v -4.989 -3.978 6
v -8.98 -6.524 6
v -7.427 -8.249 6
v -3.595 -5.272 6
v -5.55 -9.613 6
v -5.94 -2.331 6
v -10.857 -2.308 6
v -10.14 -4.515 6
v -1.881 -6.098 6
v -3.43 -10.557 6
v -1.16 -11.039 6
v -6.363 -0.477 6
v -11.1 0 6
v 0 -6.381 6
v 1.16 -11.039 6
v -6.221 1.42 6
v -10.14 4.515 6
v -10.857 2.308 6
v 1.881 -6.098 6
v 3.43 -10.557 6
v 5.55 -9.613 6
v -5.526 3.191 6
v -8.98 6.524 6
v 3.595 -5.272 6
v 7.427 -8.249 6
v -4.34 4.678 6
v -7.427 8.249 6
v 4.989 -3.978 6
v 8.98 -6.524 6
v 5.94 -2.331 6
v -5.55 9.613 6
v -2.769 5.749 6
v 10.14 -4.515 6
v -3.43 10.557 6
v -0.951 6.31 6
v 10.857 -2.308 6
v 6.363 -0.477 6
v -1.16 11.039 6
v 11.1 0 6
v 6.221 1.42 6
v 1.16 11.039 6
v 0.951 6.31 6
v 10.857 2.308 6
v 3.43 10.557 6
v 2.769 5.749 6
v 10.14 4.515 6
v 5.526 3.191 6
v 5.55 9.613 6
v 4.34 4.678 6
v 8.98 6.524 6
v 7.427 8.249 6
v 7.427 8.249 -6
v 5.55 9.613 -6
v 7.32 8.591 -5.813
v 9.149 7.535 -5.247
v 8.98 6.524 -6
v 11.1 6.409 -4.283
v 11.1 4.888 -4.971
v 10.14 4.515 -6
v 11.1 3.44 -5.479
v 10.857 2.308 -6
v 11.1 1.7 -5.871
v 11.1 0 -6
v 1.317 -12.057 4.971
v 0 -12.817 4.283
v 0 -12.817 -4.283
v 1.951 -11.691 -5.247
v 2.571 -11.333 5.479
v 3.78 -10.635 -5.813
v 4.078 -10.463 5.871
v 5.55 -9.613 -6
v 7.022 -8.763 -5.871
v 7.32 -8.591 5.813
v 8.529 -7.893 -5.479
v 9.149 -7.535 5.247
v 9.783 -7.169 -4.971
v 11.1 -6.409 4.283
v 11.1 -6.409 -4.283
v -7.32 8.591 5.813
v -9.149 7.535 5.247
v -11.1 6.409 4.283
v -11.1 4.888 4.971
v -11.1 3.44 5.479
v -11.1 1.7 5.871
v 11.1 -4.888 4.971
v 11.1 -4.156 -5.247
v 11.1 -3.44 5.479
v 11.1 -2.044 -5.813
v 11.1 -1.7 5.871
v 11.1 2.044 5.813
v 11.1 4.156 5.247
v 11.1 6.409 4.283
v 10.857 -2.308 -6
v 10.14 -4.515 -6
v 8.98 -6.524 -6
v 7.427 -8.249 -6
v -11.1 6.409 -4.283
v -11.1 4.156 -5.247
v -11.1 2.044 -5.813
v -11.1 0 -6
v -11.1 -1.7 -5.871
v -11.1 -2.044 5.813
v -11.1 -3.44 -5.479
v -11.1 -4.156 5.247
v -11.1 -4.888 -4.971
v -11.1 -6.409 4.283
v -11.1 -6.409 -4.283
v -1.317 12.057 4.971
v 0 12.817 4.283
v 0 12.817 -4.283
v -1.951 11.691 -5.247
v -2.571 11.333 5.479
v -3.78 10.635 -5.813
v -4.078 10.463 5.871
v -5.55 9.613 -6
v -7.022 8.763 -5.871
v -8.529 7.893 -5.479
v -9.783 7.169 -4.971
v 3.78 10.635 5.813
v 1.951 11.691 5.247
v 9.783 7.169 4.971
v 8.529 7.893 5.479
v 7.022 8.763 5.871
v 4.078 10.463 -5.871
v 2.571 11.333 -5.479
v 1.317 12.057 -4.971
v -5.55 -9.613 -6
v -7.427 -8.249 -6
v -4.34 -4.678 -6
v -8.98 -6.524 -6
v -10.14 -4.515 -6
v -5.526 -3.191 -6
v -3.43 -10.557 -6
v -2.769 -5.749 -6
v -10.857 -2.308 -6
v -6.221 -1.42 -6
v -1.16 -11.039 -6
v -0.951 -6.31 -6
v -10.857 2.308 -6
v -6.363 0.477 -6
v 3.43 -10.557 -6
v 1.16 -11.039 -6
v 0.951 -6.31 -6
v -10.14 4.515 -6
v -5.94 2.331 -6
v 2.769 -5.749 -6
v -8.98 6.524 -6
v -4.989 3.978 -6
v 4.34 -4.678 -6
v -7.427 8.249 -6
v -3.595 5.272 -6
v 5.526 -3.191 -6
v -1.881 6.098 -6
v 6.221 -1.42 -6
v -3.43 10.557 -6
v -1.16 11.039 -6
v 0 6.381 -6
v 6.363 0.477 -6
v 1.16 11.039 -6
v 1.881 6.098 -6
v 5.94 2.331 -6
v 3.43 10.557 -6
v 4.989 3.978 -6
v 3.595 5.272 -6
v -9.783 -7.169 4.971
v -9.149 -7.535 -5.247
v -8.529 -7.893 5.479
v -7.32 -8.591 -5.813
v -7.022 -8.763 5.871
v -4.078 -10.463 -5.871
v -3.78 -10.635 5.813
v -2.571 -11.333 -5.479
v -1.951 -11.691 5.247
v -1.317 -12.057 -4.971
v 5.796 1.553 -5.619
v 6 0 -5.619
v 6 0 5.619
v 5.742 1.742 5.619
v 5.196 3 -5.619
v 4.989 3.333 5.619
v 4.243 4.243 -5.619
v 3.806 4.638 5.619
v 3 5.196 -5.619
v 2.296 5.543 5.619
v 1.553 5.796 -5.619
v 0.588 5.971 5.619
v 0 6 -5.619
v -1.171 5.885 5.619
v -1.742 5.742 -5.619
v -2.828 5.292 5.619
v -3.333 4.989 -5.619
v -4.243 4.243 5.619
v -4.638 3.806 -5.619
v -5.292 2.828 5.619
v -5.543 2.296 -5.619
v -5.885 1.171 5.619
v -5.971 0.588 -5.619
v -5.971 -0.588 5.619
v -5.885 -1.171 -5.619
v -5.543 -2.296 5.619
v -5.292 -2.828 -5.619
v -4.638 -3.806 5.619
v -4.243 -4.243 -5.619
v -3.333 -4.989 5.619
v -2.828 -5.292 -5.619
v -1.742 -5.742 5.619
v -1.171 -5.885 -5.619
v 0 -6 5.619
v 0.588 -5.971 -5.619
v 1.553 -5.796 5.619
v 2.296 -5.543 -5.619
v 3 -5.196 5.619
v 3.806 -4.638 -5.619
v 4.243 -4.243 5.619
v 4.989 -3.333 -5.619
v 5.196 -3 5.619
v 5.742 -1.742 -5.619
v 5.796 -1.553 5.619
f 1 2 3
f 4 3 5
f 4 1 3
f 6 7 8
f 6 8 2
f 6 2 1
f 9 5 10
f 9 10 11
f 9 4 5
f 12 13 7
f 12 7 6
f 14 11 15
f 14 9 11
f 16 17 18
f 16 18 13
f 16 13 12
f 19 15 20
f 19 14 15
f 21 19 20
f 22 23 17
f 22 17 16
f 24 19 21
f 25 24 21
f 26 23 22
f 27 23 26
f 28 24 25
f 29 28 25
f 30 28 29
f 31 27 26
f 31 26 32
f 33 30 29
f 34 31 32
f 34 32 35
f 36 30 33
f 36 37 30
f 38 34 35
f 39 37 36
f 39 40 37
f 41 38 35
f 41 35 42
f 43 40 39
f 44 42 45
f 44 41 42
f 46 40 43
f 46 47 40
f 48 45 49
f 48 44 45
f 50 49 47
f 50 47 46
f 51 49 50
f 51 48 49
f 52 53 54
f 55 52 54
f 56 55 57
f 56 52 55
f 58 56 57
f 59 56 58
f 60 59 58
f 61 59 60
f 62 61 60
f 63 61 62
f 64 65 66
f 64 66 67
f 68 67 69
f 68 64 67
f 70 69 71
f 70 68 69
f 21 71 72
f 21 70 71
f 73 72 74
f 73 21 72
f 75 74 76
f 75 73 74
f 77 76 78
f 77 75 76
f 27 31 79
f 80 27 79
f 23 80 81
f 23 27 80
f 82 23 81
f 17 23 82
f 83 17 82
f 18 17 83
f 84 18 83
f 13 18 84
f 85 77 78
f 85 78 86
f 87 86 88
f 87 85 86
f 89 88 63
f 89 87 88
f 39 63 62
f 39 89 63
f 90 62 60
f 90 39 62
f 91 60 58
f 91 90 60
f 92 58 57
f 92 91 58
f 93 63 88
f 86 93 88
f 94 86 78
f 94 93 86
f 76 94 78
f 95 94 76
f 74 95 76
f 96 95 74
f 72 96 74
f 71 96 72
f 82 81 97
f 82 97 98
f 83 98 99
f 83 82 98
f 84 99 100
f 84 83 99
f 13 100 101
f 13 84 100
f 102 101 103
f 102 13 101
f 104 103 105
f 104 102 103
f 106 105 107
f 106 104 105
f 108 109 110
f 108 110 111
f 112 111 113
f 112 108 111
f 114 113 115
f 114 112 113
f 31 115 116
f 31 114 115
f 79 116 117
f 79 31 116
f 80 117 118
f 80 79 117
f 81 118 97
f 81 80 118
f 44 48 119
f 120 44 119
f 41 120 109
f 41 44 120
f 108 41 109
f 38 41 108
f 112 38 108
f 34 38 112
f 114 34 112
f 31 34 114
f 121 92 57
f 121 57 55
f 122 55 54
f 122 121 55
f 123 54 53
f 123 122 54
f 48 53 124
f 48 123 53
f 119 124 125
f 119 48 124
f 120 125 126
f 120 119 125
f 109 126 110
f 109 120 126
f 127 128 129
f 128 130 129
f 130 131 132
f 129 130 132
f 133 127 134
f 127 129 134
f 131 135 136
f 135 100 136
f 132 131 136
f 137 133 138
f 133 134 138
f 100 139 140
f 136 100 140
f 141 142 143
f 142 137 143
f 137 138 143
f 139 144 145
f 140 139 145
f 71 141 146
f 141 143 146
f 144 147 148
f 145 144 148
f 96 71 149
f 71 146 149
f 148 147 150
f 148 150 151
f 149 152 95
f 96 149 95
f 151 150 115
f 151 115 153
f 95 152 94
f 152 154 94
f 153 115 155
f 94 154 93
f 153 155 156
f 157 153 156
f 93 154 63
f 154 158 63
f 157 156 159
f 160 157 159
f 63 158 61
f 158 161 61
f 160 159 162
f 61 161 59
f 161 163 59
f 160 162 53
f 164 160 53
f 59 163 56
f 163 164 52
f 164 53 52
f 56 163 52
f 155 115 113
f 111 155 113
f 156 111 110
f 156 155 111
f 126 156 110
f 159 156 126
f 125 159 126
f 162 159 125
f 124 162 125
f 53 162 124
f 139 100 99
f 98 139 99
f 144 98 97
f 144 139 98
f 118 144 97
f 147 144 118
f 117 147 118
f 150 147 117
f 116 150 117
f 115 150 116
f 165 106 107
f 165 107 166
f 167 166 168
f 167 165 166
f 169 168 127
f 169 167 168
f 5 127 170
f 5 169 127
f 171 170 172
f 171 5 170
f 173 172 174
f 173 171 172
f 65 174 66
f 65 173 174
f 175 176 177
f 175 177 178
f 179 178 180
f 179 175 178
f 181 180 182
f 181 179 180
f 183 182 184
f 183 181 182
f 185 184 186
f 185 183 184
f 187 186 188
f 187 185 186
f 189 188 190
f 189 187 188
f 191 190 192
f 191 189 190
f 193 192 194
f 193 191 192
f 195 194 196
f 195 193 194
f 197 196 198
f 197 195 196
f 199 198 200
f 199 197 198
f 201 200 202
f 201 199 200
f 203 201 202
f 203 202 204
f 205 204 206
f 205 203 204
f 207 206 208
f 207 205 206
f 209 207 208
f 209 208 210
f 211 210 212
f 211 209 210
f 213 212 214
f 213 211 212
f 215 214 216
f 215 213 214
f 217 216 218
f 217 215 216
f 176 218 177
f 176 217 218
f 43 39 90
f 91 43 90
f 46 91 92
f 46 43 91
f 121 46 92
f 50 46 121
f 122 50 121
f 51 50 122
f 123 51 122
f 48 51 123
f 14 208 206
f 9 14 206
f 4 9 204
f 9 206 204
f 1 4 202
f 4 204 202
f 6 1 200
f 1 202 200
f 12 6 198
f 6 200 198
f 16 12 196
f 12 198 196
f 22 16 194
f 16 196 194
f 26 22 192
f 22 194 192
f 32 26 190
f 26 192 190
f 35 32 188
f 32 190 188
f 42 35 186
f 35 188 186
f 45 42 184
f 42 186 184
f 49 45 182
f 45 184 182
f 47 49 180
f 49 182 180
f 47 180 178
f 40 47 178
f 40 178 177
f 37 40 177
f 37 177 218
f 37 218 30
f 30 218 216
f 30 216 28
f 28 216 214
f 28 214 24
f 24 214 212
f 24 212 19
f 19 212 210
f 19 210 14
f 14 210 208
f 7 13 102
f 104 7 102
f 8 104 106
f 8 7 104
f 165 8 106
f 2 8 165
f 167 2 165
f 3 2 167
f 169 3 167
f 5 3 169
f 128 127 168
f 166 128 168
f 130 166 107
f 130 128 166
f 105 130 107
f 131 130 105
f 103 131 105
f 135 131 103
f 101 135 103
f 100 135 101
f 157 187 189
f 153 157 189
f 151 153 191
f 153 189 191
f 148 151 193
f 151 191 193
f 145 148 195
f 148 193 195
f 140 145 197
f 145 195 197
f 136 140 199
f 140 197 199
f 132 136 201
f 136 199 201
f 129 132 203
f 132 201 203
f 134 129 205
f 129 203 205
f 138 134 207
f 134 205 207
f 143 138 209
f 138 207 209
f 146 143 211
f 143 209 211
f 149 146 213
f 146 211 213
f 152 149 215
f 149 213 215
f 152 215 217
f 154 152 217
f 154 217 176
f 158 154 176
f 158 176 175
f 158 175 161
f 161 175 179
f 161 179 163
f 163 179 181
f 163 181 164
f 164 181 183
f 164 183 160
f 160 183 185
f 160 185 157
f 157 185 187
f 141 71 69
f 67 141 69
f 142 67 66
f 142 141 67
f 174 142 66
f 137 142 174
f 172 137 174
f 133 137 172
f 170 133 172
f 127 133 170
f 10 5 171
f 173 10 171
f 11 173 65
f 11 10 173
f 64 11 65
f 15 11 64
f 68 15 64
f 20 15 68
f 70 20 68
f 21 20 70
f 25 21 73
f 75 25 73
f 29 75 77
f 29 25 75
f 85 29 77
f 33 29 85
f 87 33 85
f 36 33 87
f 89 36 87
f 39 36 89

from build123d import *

# Parameters (mm, degrees)
SKETCH1_R           = 6
BOSS_EXTRUDE1_DEPTH = 6
SKETCH6_OUTSIDE_W   = 74.94
SKETCH6_OUTSIDE_H   = 78.374
SKETCH6_OUTSIDE_R   = 11.1
CUT_EXTRUDE5_DEPTH  = 21.772337374
CUT_EXTRUDE5_DRAFT  = -45
SKETCH7_OUTSIDE_W   = 74.94
SKETCH7_OUTSIDE_H   = 78.374
SKETCH7_OUTSIDE_R   = 11.1
CUT_EXTRUDE6_DEPTH  = 21.772337374
CUT_EXTRUDE6_DRAFT  = -45


with BuildPart() as part:
    # Sketch1 → Boss-Extrude1 (new, symmetric)
    with BuildSketch(Plane.XY):
        Polygon((0, -12.817175976), (11.1, -6.408587988), (11.1, 6.408587988), (0, 12.817175976), (-11.1, 6.408587988), (-11.1, -6.408587988), align=None)
        Circle(SKETCH1_R, mode=Mode.SUBTRACT)
    extrude(amount=BOSS_EXTRUDE1_DEPTH, both=True)

    # Cut-Extrude3 cone 1 section (through the dimple's axis) → Cut-Extrude3 (revolve, cut)
    with BuildSketch(Plane(origin=(0, 0, 6), x_dir=(0, -1, 0), z_dir=(1, 0, 0))):
        Polygon((0, 0), (6.381, 0), (0, 6.381), align=None)
    revolve(axis=Axis((0, 0, 6), (0, 0, -1)), mode=Mode.SUBTRACT)

    # Cut-Extrude4 cone 1 section (through the dimple's axis) → Cut-Extrude4 (revolve, cut)
    with BuildSketch(Plane(origin=(0, 0, -6), x_dir=(0, 1, 0), z_dir=(1, 0, 0))):
        Polygon((0, 0), (6.381, 0), (0, 6.381), align=None)
    revolve(axis=Axis((0, 0, -6), (0, 0, 1)), mode=Mode.SUBTRACT)


with BuildPart() as cut_extrude5_tool:
    # Sketch6 outside → Cut-Extrude5 (with draft: the straight prism first)
    with BuildSketch(Plane.XY.offset(6)):
        Rectangle(SKETCH6_OUTSIDE_W, SKETCH6_OUTSIDE_H)
        Circle(SKETCH6_OUTSIDE_R, mode=Mode.SUBTRACT)
    extrude(amount=-CUT_EXTRUDE5_DEPTH)
    # Cut-Extrude5: the draft: its side faces are tilted about the plane it starts from
    cut_extrude5_sides = [cut_extrude5_tool.faces().sort_by_distance(p)[0] for p in [
        (0, -39.187, -4.886168687),
        (37.47, 0, -4.886168687),
        (0, 39.187, -4.886168687),
        (-37.47, 0, -4.886168687),
        (-11.1, 0, -4.886168687),
    ]]
    draft(cut_extrude5_sides, Plane.XY.offset(6), CUT_EXTRUDE5_DRAFT)


with BuildPart() as part_1:
    add(part.part)

    # Cut-Extrude5: cut by cut_extrude5_tool
    add(cut_extrude5_tool.part, mode=Mode.SUBTRACT)


with BuildPart() as cut_extrude6_tool:
    # Sketch7 outside → Cut-Extrude6 (with draft: the straight prism first)
    with BuildSketch(Plane(origin=(0, 0, -6), x_dir=(-1, 0, 0), z_dir=(0, 0, -1))):
        Rectangle(SKETCH7_OUTSIDE_W, SKETCH7_OUTSIDE_H)
        Circle(SKETCH7_OUTSIDE_R, mode=Mode.SUBTRACT)
    extrude(amount=-CUT_EXTRUDE6_DEPTH)
    # Cut-Extrude6: the draft: its side faces are tilted about the plane it starts from
    cut_extrude6_sides = [cut_extrude6_tool.faces().sort_by_distance(p)[0] for p in [
        (0, -39.187, 4.886168687),
        (-37.47, 0, 4.886168687),
        (0, 39.187, 4.886168687),
        (37.47, 0, 4.886168687),
        (11.1, 0, 4.886168687),
    ]]
    draft(cut_extrude6_sides, Plane(origin=(0, 0, -6), x_dir=(-1, 0, 0), z_dir=(0, 0, -1)), CUT_EXTRUDE6_DRAFT)


with BuildPart() as part_2:
    add(part_1.part)

    # Cut-Extrude6: cut by cut_extrude6_tool
    add(cut_extrude6_tool.part, mode=Mode.SUBTRACT)


solid = part_2.part
